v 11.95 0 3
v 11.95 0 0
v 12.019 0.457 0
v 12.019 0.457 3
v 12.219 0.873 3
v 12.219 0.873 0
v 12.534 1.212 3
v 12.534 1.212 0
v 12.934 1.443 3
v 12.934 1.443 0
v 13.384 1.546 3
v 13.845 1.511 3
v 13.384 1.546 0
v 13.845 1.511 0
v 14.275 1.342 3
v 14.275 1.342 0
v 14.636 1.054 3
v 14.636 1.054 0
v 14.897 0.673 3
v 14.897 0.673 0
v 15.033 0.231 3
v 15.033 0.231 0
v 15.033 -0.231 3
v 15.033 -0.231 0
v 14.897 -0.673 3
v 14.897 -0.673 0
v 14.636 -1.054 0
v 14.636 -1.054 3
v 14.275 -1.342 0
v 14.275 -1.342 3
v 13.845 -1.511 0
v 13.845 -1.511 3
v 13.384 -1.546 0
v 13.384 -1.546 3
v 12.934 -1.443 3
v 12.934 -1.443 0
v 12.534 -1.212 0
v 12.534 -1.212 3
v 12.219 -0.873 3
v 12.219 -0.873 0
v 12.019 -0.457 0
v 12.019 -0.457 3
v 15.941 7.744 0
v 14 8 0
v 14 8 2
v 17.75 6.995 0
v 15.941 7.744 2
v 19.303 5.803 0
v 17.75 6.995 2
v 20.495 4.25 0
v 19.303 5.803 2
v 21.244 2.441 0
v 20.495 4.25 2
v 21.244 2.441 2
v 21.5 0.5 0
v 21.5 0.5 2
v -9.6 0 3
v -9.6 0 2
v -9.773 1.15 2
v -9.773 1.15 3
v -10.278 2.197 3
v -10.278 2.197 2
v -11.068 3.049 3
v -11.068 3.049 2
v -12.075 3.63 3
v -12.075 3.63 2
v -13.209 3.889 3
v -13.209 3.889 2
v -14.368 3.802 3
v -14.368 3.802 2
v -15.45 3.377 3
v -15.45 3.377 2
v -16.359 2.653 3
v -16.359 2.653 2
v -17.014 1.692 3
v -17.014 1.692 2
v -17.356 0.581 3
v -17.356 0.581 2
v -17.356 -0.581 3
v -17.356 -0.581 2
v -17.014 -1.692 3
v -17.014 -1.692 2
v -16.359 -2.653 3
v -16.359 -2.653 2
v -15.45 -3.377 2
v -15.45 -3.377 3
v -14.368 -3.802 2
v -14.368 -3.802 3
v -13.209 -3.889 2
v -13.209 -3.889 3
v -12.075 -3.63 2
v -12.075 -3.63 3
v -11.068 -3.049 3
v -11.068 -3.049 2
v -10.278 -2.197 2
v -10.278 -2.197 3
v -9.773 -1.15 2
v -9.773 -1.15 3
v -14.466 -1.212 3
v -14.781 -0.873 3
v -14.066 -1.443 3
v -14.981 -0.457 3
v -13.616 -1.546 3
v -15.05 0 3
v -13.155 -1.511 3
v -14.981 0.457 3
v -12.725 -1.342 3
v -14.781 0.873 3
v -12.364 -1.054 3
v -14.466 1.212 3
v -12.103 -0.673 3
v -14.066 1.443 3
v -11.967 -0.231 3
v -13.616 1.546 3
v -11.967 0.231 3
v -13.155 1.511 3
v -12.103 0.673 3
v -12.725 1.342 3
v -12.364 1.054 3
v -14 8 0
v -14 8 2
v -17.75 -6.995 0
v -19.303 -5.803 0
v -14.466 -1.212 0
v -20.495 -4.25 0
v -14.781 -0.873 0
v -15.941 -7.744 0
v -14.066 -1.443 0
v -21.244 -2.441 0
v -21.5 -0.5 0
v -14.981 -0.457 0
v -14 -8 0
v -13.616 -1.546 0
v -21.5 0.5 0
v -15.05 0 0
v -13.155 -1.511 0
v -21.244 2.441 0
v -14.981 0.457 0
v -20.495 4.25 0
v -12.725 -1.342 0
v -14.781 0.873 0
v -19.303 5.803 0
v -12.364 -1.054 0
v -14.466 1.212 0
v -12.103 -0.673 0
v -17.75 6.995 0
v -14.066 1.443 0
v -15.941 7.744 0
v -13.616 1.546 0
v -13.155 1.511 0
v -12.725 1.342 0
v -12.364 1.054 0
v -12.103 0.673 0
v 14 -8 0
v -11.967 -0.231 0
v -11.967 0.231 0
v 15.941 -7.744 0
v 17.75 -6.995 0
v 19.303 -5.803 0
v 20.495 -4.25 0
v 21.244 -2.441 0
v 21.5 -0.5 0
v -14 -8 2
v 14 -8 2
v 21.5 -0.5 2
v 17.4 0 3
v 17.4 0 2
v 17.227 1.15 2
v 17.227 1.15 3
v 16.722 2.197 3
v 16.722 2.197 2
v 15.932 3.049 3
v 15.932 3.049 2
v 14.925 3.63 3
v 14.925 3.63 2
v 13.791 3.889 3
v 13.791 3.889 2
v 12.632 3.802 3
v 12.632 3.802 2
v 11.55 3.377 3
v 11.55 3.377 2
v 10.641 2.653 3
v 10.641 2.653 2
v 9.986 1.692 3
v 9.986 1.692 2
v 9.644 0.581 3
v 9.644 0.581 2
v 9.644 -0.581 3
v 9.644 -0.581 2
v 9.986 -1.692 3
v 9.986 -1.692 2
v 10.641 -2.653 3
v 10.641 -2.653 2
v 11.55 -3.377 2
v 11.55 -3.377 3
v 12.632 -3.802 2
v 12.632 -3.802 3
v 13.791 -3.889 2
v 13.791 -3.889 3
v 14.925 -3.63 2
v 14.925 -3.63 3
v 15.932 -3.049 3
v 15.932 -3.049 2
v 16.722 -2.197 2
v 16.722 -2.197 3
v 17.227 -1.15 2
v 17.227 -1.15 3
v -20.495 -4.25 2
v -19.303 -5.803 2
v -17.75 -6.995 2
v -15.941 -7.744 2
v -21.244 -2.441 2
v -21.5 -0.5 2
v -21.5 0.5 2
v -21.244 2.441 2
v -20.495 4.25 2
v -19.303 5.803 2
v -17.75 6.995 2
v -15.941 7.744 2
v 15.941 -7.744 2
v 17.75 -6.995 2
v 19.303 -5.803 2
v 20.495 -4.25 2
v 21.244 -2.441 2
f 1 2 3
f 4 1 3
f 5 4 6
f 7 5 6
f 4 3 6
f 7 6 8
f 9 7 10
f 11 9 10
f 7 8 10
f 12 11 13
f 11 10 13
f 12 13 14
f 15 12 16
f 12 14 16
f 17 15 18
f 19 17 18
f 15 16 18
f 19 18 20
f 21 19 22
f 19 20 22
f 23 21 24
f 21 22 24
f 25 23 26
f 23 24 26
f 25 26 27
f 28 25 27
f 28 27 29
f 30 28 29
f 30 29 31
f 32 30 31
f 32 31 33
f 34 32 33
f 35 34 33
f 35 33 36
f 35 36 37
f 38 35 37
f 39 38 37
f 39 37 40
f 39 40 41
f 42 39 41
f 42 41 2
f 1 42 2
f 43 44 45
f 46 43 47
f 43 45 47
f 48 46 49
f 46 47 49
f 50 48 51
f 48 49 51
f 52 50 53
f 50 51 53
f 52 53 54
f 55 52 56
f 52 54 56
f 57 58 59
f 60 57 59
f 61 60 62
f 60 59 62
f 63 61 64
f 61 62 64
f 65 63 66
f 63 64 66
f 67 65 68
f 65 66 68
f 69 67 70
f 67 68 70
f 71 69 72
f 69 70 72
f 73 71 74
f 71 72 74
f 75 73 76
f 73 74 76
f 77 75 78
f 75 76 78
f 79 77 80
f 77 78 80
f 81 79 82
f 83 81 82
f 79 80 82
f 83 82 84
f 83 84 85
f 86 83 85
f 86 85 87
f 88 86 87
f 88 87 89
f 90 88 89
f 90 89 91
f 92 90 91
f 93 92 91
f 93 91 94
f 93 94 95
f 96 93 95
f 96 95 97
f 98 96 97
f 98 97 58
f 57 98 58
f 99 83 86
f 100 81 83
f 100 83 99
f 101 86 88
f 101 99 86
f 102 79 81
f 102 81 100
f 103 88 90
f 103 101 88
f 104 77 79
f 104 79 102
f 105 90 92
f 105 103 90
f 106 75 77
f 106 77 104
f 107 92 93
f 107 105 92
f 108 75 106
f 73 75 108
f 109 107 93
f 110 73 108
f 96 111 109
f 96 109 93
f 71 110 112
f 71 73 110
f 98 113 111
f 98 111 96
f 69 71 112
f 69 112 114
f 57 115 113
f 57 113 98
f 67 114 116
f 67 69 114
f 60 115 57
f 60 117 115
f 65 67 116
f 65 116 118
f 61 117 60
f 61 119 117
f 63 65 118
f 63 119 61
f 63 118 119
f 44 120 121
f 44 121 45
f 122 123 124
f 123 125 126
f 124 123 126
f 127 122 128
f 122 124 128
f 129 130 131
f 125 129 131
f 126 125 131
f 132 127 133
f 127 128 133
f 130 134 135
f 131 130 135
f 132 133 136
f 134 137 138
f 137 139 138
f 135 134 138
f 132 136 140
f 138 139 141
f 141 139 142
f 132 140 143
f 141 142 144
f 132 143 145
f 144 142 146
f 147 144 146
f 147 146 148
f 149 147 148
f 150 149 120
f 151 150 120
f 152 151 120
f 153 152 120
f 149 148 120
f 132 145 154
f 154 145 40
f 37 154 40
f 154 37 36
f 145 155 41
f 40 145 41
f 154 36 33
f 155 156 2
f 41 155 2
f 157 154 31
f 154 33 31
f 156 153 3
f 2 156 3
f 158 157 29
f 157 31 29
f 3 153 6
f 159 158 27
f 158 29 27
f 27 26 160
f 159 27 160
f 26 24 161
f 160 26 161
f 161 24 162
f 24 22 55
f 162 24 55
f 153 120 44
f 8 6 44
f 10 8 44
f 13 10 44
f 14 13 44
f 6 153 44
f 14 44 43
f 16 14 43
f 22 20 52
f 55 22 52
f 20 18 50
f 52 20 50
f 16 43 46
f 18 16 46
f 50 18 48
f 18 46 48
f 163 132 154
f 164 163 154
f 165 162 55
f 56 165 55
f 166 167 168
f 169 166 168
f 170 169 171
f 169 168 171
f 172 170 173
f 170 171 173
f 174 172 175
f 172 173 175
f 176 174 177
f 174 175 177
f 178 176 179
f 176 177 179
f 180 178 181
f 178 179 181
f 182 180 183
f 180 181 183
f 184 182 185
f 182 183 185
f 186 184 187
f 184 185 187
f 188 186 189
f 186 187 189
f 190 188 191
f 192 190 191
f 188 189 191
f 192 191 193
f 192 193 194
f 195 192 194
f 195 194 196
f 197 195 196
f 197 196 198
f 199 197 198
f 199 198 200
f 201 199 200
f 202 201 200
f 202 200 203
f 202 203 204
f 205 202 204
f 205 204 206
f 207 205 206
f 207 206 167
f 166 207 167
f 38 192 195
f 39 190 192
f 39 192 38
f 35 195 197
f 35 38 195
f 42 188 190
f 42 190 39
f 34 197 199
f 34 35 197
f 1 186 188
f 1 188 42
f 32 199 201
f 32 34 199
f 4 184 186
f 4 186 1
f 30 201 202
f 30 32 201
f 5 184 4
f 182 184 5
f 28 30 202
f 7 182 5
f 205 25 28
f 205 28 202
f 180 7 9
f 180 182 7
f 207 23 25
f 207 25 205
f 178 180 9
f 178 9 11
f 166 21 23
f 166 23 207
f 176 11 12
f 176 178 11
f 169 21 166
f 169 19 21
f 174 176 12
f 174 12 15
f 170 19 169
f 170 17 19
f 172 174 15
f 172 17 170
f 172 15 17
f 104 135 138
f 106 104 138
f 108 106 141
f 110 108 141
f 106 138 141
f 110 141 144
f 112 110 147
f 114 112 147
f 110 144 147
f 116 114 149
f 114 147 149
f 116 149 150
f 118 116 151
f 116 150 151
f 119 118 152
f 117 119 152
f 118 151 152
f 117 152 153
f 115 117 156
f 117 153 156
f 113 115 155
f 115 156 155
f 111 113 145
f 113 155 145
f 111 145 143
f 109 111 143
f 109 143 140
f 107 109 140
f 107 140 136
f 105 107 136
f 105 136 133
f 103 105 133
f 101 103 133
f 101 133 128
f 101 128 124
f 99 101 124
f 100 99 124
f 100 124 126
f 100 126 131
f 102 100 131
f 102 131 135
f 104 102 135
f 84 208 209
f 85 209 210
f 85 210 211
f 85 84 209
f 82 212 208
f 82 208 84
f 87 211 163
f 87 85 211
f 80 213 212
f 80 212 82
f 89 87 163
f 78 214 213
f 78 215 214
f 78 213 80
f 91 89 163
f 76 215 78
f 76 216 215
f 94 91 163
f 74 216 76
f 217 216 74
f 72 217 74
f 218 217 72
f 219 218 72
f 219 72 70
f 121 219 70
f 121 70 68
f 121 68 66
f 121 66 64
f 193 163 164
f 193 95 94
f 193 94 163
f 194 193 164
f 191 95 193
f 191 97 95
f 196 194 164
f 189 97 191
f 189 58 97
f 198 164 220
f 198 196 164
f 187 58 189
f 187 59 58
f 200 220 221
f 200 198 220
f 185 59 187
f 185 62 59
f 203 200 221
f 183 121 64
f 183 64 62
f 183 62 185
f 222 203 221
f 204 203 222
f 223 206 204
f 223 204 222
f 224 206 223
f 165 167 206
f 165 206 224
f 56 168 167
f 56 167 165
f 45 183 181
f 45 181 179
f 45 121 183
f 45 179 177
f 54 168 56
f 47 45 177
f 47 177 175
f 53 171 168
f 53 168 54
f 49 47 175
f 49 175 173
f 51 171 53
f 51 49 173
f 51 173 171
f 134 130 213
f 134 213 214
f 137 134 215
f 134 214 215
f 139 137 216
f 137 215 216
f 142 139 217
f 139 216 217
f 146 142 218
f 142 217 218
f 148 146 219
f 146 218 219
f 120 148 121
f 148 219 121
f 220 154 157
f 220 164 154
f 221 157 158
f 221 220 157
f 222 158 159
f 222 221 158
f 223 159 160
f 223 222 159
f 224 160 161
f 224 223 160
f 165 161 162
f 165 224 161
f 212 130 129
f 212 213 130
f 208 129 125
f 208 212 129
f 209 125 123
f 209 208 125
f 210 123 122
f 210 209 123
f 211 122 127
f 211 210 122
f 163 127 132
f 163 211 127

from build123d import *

# Parameters (mm, degrees)
F0_W     = 43
F0_H     = 16
F1_DEPTH = 2
F2_R     = 3.9
F3_DEPTH = 3
F5_D     = 3.1
F6_R     = 7.5


with BuildPart() as f1:
    # F0 (on Top) → F1 (new body)
    with BuildSketch(Plane.XY):
        Rectangle(F0_W, F0_H)
    extrude(amount=F1_DEPTH)

    # F2 (on Top) → F3 (join)
    with BuildSketch(Plane.XY):
        with Locations((-13.5, 0)):
            Circle(F2_R)
        with Locations((13.5, 0)):
            Circle(F2_R)
    extrude(amount=F3_DEPTH)

    # F5 (through all)
    with Locations(Plane.XY.offset(3)):
        with Locations((-13.5, 0), (13.5, 0)):
            Hole(F5_D / 2)

    # F6
    f6_edges = [f1.edges().sort_by_distance(p)[0] for p in [
        (-21.5, -8, 1),
        (21.5, -8, 1),
        (21.5, 8, 1),
        (-21.5, 8, 1),
    ]]
    fillet(f6_edges, radius=F6_R)


solid = f1.part
